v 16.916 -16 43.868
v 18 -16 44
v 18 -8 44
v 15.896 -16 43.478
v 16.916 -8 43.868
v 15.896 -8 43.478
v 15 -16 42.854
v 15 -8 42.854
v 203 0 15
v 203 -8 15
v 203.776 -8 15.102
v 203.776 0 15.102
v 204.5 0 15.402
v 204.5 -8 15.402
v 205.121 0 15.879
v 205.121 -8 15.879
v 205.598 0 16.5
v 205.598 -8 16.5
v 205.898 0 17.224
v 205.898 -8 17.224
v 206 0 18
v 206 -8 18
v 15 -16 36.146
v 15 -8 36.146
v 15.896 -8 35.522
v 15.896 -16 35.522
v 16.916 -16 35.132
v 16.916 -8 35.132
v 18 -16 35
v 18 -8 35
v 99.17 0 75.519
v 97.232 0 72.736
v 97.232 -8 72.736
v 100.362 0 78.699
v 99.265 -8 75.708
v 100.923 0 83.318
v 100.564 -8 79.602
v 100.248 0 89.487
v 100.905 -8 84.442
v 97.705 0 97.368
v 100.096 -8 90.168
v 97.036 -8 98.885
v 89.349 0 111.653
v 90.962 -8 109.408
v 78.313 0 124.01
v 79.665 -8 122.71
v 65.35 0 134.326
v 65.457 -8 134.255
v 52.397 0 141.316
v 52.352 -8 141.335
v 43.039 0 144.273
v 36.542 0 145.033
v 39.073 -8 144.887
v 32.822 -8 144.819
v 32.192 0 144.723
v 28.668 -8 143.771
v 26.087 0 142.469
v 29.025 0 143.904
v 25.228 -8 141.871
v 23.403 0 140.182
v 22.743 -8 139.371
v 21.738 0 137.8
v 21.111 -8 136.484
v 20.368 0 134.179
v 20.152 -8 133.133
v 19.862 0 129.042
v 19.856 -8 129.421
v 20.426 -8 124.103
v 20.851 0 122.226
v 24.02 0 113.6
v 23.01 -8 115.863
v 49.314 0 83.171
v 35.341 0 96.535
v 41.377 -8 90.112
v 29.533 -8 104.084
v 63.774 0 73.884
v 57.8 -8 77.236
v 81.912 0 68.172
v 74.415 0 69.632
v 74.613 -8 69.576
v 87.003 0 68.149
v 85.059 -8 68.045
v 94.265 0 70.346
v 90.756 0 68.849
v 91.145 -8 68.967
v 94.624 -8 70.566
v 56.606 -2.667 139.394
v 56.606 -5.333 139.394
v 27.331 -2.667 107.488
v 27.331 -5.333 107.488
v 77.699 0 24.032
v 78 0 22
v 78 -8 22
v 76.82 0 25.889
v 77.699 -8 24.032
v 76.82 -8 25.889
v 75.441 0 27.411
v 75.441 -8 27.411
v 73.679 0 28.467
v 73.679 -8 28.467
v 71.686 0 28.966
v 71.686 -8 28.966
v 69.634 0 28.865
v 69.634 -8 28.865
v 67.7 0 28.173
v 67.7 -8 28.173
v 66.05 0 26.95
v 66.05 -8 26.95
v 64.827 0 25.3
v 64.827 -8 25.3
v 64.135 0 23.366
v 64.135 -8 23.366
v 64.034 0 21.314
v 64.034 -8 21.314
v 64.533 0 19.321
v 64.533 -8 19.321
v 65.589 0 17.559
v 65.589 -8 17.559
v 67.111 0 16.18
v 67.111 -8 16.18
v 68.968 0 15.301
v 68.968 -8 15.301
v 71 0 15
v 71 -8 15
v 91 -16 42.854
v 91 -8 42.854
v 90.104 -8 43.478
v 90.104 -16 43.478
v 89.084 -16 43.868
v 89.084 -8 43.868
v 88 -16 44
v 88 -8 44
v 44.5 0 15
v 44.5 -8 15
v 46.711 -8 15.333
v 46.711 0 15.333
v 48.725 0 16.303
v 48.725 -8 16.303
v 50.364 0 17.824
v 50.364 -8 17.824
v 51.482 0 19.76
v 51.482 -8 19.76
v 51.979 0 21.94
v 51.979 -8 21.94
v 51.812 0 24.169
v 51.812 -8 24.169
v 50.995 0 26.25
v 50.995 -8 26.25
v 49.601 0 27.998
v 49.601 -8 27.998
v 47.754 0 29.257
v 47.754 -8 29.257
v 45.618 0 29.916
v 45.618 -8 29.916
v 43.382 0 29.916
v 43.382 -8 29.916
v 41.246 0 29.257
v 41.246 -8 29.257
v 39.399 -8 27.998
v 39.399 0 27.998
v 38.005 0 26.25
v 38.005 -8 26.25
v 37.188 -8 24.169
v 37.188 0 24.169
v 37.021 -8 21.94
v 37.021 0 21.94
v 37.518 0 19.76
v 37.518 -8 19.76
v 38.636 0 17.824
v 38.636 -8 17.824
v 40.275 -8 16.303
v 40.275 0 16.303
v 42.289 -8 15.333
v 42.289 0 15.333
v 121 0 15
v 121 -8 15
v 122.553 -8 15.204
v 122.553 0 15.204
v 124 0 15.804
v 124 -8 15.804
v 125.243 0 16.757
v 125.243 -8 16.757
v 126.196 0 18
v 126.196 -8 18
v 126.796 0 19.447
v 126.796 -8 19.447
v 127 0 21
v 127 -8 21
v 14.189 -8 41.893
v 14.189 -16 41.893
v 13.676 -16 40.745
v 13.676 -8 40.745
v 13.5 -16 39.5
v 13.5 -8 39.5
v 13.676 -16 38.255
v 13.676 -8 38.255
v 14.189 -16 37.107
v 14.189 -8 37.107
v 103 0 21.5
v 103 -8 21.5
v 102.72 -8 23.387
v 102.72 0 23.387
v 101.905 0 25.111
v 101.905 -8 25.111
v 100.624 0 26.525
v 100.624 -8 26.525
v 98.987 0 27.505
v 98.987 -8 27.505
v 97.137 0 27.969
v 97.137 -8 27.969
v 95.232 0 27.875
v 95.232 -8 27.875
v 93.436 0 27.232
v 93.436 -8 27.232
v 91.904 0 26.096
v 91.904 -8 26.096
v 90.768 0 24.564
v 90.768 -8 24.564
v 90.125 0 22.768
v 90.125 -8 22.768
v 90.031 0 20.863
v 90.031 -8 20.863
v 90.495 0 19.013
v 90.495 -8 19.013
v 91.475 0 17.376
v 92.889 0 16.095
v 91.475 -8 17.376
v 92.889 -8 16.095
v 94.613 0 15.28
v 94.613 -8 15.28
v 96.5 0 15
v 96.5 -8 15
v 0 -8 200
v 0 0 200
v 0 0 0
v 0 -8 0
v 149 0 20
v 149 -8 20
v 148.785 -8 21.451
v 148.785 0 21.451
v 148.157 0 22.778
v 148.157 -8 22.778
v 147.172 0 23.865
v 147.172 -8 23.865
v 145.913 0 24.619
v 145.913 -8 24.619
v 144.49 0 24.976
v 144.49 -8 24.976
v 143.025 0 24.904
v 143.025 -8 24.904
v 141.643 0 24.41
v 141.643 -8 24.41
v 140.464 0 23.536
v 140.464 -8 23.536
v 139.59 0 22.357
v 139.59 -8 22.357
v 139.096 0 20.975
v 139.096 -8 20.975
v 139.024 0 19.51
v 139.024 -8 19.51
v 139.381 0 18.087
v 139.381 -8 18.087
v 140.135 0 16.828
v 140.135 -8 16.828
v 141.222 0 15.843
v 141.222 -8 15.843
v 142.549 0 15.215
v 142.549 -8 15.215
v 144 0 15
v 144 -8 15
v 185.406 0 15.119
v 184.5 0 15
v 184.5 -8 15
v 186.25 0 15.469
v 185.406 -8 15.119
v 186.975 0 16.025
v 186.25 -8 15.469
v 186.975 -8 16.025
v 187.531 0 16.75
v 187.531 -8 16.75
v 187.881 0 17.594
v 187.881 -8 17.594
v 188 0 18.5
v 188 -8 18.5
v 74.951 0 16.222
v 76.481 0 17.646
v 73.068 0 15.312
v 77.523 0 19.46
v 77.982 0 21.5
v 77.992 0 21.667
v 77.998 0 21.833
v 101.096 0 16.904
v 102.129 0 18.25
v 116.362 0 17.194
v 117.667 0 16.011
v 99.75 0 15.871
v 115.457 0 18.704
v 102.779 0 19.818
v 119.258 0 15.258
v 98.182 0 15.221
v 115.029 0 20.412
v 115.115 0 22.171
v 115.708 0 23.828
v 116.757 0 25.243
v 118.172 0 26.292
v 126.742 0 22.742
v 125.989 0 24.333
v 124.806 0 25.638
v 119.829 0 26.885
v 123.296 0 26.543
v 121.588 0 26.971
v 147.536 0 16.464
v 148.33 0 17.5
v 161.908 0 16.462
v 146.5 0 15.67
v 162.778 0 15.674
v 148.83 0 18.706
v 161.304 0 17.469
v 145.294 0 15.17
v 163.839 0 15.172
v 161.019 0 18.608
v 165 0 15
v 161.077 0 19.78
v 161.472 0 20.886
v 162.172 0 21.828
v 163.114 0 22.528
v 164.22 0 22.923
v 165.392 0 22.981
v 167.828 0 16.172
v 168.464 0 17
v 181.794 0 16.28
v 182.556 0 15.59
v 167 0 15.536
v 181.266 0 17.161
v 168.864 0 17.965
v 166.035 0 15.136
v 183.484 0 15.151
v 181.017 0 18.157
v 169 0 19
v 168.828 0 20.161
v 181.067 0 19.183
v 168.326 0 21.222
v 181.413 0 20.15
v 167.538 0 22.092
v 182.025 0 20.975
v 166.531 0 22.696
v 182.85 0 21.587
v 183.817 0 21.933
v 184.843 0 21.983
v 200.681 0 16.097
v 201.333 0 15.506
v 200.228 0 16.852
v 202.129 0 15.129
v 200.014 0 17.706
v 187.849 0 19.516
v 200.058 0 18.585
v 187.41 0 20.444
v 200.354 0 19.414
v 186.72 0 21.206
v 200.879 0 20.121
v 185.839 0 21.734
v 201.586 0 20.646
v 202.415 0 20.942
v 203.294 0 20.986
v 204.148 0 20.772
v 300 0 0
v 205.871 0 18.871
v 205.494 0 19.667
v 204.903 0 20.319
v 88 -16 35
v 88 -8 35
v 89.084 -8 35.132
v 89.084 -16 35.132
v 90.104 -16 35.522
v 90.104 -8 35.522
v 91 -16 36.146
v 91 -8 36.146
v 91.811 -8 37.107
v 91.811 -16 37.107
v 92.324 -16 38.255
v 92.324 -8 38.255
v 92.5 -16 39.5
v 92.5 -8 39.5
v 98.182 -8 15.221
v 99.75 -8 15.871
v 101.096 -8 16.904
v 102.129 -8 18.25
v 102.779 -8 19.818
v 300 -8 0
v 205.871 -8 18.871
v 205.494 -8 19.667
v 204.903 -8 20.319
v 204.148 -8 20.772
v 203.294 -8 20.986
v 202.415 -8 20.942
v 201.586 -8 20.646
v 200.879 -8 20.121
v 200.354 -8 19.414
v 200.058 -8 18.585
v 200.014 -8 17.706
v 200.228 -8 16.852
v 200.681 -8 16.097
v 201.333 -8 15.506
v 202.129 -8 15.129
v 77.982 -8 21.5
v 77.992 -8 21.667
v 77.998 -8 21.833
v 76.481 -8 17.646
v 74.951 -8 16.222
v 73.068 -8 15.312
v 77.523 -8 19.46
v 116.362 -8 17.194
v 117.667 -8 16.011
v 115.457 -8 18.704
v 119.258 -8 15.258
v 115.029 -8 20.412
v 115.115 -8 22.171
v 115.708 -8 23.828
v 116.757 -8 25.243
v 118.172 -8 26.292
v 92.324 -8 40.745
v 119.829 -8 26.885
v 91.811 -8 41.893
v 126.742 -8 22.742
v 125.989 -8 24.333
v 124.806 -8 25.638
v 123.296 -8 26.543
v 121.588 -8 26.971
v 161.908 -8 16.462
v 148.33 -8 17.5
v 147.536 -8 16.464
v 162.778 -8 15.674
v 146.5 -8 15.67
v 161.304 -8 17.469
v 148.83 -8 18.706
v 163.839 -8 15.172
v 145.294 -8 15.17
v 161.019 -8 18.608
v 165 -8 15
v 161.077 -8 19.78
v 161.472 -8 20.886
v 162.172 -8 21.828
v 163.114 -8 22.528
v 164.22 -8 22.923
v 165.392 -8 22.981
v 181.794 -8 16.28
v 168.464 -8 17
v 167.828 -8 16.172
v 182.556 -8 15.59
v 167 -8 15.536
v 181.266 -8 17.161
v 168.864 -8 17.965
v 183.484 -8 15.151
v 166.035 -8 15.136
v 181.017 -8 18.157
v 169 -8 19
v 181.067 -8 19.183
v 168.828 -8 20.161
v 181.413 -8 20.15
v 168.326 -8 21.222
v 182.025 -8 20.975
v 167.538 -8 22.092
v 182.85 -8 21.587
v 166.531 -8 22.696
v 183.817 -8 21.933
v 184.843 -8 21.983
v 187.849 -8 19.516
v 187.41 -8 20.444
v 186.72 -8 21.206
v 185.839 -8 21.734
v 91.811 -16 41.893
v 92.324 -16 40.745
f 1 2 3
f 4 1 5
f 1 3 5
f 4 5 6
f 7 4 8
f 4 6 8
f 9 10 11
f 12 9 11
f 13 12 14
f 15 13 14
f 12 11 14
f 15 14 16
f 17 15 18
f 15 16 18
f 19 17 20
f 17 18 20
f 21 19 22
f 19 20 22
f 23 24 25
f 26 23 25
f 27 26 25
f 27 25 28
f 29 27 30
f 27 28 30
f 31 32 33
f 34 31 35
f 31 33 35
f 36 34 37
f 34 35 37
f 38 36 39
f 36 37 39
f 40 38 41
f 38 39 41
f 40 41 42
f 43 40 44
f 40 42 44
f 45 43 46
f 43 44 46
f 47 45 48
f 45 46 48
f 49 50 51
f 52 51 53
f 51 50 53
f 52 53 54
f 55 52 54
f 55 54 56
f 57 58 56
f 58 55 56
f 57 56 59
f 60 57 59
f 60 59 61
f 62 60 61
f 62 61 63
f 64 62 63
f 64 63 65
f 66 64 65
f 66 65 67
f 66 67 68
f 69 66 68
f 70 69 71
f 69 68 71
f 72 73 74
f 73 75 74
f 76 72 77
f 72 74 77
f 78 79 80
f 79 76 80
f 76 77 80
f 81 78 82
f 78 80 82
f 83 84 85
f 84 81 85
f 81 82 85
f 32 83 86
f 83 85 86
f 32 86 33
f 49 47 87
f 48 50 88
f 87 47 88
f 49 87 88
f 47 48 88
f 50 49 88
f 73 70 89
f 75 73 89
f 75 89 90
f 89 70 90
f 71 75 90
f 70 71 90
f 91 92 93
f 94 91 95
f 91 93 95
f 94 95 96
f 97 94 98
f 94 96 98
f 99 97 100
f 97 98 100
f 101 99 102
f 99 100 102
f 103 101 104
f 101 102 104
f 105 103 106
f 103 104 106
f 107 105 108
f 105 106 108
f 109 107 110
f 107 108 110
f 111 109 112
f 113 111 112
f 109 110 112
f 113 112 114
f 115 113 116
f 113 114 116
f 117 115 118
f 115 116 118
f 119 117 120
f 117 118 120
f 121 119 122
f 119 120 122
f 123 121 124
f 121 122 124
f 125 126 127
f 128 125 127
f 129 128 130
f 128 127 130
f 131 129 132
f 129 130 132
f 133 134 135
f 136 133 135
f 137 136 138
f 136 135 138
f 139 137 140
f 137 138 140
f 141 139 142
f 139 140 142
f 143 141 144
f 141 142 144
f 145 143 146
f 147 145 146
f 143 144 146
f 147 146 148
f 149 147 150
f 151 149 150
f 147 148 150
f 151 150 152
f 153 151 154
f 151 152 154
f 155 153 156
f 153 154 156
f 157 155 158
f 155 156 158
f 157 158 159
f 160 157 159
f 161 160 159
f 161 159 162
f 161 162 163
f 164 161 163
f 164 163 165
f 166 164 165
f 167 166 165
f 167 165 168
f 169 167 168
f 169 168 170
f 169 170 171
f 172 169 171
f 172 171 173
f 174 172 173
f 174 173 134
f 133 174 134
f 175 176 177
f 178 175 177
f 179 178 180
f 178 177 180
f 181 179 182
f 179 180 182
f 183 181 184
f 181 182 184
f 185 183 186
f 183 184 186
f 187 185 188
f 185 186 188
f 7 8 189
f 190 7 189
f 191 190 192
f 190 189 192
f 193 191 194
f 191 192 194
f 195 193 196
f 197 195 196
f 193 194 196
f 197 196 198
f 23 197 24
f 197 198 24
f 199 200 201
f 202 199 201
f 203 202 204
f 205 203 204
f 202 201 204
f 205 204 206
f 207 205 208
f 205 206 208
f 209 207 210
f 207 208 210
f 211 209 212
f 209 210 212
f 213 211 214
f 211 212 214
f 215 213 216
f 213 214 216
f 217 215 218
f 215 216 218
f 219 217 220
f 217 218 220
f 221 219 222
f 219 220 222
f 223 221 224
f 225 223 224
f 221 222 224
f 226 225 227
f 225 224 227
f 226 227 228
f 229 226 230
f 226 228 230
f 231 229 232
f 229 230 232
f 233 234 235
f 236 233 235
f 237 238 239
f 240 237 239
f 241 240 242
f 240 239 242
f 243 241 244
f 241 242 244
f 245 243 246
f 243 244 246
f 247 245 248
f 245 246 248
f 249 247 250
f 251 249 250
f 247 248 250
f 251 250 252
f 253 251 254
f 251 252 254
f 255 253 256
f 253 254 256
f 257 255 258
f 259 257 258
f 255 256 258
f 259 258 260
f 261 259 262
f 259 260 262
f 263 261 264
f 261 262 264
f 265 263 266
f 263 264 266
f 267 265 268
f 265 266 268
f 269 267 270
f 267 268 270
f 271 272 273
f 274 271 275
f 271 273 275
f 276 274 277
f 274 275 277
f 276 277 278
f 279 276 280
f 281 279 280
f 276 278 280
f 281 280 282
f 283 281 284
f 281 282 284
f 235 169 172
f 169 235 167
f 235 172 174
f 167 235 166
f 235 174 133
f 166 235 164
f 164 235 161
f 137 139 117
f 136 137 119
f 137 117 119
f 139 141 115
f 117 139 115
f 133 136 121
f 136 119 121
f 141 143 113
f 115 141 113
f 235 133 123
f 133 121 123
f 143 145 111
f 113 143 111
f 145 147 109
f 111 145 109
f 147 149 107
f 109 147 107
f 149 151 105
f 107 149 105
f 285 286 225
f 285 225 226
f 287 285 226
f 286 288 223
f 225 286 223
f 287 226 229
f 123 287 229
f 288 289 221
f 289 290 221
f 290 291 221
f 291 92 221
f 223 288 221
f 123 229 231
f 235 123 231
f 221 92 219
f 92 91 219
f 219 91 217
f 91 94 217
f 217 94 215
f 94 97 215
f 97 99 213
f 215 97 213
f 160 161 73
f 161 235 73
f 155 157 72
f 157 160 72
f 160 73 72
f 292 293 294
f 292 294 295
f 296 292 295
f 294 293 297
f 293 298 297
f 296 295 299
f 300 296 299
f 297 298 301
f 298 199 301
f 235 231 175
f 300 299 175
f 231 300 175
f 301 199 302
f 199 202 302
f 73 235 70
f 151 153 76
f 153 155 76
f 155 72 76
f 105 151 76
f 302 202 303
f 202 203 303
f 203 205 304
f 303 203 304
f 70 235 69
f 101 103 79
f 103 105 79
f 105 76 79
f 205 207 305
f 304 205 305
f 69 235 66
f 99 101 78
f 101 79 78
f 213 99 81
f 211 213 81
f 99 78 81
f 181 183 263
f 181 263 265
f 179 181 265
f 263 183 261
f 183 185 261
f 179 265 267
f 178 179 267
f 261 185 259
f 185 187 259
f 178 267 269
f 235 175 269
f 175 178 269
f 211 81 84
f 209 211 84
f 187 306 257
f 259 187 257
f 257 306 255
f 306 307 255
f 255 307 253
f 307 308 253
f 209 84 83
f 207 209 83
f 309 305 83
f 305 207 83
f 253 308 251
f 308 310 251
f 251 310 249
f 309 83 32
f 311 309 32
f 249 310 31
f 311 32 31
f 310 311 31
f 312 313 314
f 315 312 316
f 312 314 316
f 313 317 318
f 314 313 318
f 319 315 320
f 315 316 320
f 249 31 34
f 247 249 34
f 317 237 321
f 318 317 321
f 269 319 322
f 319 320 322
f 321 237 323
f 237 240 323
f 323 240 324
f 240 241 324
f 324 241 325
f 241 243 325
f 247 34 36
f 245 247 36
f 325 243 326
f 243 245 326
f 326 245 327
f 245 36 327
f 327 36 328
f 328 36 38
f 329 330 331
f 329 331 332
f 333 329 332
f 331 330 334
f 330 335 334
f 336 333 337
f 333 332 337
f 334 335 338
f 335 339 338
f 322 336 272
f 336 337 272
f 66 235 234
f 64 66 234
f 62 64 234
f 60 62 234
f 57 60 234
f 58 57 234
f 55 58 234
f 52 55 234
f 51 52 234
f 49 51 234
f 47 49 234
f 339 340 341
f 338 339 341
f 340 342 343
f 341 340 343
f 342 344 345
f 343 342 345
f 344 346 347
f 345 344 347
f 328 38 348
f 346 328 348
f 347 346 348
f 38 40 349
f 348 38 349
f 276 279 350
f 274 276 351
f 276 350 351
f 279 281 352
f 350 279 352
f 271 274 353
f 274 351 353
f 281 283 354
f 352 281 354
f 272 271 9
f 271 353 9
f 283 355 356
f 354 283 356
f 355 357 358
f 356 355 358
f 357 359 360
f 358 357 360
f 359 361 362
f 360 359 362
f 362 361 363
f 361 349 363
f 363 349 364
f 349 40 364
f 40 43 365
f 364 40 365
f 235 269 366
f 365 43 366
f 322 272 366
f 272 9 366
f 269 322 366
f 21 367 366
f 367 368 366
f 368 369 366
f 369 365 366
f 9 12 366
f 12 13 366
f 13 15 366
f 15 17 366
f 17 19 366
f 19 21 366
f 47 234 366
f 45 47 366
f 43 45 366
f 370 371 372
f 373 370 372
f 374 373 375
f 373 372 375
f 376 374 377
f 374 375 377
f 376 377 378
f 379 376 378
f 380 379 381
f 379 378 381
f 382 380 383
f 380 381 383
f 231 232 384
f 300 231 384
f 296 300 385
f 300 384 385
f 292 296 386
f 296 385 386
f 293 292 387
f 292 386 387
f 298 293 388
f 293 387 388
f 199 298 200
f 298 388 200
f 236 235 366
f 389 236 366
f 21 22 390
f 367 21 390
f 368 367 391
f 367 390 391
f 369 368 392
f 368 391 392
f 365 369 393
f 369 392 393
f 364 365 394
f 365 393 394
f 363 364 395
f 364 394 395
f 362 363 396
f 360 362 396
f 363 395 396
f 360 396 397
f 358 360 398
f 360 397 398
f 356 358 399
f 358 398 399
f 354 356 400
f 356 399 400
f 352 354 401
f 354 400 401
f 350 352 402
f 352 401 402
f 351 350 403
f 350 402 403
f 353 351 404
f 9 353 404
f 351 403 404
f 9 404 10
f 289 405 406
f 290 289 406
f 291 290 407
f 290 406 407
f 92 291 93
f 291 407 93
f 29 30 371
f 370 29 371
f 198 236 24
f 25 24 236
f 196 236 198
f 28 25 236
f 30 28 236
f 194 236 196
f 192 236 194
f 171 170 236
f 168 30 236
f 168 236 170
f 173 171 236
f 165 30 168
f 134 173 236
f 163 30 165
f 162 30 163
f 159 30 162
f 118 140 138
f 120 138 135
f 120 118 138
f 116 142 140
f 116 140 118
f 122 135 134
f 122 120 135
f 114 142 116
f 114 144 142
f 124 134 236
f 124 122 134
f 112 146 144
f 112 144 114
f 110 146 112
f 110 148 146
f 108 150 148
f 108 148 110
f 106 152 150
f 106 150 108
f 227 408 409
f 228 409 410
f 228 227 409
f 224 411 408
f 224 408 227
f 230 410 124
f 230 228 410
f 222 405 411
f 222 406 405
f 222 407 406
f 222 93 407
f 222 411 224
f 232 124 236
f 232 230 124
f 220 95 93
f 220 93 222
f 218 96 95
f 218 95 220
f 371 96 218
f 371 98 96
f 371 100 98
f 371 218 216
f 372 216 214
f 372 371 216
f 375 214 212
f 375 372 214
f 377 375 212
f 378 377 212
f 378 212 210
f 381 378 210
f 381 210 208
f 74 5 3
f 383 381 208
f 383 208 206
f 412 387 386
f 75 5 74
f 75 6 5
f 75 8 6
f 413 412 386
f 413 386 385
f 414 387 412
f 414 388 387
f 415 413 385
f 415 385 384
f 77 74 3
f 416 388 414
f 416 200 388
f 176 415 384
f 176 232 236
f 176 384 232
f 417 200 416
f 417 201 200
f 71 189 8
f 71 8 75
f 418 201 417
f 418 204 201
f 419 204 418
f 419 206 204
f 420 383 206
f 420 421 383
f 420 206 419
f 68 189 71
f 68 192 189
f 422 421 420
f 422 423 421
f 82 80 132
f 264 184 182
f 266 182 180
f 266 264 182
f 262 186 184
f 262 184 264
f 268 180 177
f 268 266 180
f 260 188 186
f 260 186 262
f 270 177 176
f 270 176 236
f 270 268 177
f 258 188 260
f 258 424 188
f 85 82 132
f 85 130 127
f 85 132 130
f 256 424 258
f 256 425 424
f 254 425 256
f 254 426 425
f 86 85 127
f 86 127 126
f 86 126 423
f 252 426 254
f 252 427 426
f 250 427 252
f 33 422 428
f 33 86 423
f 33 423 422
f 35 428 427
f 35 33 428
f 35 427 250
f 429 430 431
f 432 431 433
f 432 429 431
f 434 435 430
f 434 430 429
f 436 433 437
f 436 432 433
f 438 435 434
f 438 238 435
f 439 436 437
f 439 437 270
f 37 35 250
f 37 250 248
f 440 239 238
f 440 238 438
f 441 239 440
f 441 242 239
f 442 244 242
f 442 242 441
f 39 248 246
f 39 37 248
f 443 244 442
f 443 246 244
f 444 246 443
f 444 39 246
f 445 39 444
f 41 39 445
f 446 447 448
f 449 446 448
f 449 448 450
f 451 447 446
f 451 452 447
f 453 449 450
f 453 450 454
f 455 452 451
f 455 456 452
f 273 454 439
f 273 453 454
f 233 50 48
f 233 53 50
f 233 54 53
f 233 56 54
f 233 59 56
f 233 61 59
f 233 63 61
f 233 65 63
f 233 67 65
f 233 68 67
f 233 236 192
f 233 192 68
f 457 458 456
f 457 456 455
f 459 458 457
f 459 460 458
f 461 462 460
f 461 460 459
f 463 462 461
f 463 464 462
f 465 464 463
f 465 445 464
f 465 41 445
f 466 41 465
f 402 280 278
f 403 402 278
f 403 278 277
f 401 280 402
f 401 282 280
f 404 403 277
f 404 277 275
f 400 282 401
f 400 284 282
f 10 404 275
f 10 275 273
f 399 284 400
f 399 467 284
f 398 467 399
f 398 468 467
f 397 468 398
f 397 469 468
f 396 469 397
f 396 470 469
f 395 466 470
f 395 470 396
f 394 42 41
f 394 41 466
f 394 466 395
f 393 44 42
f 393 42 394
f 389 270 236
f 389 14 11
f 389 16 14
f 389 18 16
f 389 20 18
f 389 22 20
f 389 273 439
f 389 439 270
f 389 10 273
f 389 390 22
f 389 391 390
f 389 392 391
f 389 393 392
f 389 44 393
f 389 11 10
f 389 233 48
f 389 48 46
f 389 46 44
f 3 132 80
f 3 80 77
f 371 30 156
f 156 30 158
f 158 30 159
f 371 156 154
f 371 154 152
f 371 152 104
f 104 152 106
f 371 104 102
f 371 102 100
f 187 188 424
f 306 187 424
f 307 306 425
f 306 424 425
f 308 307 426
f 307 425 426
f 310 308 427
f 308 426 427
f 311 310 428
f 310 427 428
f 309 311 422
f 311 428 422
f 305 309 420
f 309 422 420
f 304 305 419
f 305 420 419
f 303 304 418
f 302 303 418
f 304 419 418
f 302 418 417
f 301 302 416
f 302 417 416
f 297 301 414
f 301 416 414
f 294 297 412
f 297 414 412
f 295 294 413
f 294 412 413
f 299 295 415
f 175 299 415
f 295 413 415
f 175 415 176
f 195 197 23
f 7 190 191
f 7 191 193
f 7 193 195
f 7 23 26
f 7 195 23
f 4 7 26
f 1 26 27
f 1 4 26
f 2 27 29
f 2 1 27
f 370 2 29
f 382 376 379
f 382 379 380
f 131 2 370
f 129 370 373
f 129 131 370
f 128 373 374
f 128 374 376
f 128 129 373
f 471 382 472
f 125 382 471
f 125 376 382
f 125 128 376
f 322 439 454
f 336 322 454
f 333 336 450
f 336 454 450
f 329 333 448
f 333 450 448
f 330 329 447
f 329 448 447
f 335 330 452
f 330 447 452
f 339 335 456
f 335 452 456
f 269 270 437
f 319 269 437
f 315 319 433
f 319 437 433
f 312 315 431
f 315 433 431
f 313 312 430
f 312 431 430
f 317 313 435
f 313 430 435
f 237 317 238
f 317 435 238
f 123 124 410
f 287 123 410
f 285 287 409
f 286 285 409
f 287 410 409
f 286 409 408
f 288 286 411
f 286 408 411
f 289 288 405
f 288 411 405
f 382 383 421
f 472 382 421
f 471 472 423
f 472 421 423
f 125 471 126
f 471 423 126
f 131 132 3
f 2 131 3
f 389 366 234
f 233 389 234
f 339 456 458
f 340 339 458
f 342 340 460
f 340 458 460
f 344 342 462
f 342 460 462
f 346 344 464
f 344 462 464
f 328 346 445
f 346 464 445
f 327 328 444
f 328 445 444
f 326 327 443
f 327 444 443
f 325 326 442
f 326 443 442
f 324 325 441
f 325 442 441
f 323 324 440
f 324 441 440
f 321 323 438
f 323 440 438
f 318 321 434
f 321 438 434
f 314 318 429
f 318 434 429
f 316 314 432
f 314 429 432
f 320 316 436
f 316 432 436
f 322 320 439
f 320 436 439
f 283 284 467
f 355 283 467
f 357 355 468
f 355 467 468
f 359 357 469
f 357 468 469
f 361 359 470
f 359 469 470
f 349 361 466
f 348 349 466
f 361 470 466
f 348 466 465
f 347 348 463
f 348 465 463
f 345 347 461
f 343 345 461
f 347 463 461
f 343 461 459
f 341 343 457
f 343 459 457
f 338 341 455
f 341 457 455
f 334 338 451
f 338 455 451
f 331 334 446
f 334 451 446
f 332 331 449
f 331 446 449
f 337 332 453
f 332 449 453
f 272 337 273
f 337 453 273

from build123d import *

# Parameters (mm, degrees)
F1_DEPTH  = 8
F3_DEPTH  = 25
F5_DEPTH  = 8
F7_DEPTH  = 25
F9_DEPTH  = 25
F11_DEPTH = 25


with BuildPart() as f1:
    # F0 (on Front) → F1 (new body)
    with BuildSketch(Plane.XZ):
        Polygon((0, 200), (0, 0), (300, 0), align=None)
    extrude(amount=F1_DEPTH)

    # F2 (on face) → F3 (cut)
    with BuildSketch(Plane.XZ.offset(8)):
        with BuildLine():
            ThreePointArc((103, 21.5), (91.9038059223, 26.0961940777), (96.5, 15))
            ThreePointArc((96.5, 15), (101.0961940777, 16.9038059223), (103, 21.5))
        make_face()
        with BuildLine():
            ThreePointArc((127, 21), (116.7573593129, 25.2426406871), (121, 15))
            ThreePointArc((121, 15), (125.2426406871, 16.7573593129), (127, 21))
        make_face()
        with BuildLine():
            ThreePointArc((149, 20), (140.4644660941, 23.5355339059), (144, 15))
            ThreePointArc((144, 15), (147.5355339059, 16.4644660941), (149, 20))
        make_face()
        with BuildLine():
            ThreePointArc((169, 19), (162.1715728753, 21.8284271247), (165, 15))
            ThreePointArc((165, 15), (167.8284271247, 16.1715728753), (169, 19))
        make_face()
        with BuildLine():
            ThreePointArc((188, 18.5), (182.0251262658, 20.9748737342), (184.5, 15))
            ThreePointArc((184.5, 15), (186.9748737342, 16.0251262658), (188, 18.5))
        make_face()
        with BuildLine():
            ThreePointArc((206, 18), (200.8786796564, 20.1213203436), (203, 15))
            ThreePointArc((203, 15), (205.1213203436, 15.8786796564), (206, 18))
        make_face()
    extrude(amount=-F3_DEPTH, mode=Mode.SUBTRACT)

    # F4 (on face) → F5 (join)
    with BuildSketch(Plane.XZ.offset(8)):
        with BuildLine():
            ThreePointArc((15, 42.8541019662), (13.5, 39.5), (15, 36.1458980338))
            Line((15, 36.1458980338), (15, 39.5))
            Line((15, 39.5), (15, 42.8541019662))
        make_face()
        with BuildLine():
            Line((15, 39.5), (15, 36.1458980338))
            ThreePointArc((15, 36.1458980338), (16.3943005877, 35.2962243879), (17.9999999821, 35))
            ThreePointArc((17.9999999821, 35), (21.181980509, 36.3180194783), (22.5, 39.5))
            ThreePointArc((22.5, 39.5), (21.1819805153, 42.6819805153), (18, 44))
            ThreePointArc((18, 44), (16.394300596, 43.7037756153), (15, 42.8541019662))
            Line((15, 42.8541019662), (15, 39.5))
        make_face()
        with BuildLine():
            ThreePointArc((22.5, 39.5), (21.181980509, 36.3180194783), (17.9999999821, 35))
            Line((17.9999999821, 35), (88, 35))
            ThreePointArc((88, 35), (83.5, 39.5), (88, 44))
            Line((88, 44), (18, 44))
            ThreePointArc((18, 44), (21.1819805153, 42.6819805153), (22.5, 39.5))
        make_face()
        with BuildLine():
            ThreePointArc((88, 44), (83.5, 39.5), (88, 35))
            ThreePointArc((88, 35), (89.605699404, 35.2962243847), (91, 36.1458980338))
            Line((91, 36.1458980338), (91, 39.5))
            Line((91, 39.5), (91, 42.8541019662))
            ThreePointArc((91, 42.8541019662), (89.605699404, 43.7037756153), (88, 44))
        make_face()
        with BuildLine():
            Line((91, 39.5), (91, 36.1458980338))
            ThreePointArc((91, 36.1458980338), (92.1079191813, 37.6628826929), (92.5, 39.5))
            ThreePointArc((92.5, 39.5), (92.1079191813, 41.3371173071), (91, 42.8541019662))
            Line((91, 42.8541019662), (91, 39.5))
        make_face()
    extrude(amount=F5_DEPTH)

    # F6 (on face) → F7 (cut)
    with BuildSketch(Plane.XZ.offset(8)):
        with BuildLine():
            add(Edge.make_bspline(
                [(97.2316949817, 72.7356295876), (126.5063207343, 104.641683669), (56.60610112, 139.3937958045), (-13.2941184942, 174.1459079399), (27.3314753674, 107.4877417231), (67.957069229, 40.8295755063), (97.2316949817, 72.7356295876)],
                knots=[0, 0, 0, 2.0943951024, 2.0943951024, 4.1887902048, 4.1887902048, 6.2831853072, 6.2831853072, 6.2831853072], degree=2, weights=[1, 0.5, 1, 0.5, 1, 0.5, 1]))
        make_face()
    extrude(amount=-F7_DEPTH, mode=Mode.SUBTRACT)

    # F8 (on face) → F9 (cut)
    with BuildSketch(Plane.XZ.offset(8)):
        with BuildLine():
            Line((71, 21.5), (71, 15))
            ThreePointArc((71, 15), (75.7696960071, 16.876524617), (77.9821200219, 21.5))
            Line((77.9821200219, 21.5), (71, 21.5))
        make_face()
        with BuildLine():
            ThreePointArc((78, 22), (66.0502525317, 26.9497474683), (71, 15))
            Line((71, 15), (71, 21.5))
            Line((71, 21.5), (77.9821200219, 21.5))
            ThreePointArc((77.9821200219, 21.5), (77.9955285774, 21.7498402043), (78, 22))
        make_face()
    extrude(amount=-F9_DEPTH, mode=Mode.SUBTRACT)

    # F10 (on face) → F11 (cut)
    with BuildSketch(Plane.XZ.offset(8)):
        with BuildLine():
            ThreePointArc((52, 22.5), (39.1966991411, 27.8033008589), (44.5, 15))
            ThreePointArc((44.5, 15), (49.8033008589, 17.1966991411), (52, 22.5))
        make_face()
    extrude(amount=-F11_DEPTH, mode=Mode.SUBTRACT)


solid = f1.part
